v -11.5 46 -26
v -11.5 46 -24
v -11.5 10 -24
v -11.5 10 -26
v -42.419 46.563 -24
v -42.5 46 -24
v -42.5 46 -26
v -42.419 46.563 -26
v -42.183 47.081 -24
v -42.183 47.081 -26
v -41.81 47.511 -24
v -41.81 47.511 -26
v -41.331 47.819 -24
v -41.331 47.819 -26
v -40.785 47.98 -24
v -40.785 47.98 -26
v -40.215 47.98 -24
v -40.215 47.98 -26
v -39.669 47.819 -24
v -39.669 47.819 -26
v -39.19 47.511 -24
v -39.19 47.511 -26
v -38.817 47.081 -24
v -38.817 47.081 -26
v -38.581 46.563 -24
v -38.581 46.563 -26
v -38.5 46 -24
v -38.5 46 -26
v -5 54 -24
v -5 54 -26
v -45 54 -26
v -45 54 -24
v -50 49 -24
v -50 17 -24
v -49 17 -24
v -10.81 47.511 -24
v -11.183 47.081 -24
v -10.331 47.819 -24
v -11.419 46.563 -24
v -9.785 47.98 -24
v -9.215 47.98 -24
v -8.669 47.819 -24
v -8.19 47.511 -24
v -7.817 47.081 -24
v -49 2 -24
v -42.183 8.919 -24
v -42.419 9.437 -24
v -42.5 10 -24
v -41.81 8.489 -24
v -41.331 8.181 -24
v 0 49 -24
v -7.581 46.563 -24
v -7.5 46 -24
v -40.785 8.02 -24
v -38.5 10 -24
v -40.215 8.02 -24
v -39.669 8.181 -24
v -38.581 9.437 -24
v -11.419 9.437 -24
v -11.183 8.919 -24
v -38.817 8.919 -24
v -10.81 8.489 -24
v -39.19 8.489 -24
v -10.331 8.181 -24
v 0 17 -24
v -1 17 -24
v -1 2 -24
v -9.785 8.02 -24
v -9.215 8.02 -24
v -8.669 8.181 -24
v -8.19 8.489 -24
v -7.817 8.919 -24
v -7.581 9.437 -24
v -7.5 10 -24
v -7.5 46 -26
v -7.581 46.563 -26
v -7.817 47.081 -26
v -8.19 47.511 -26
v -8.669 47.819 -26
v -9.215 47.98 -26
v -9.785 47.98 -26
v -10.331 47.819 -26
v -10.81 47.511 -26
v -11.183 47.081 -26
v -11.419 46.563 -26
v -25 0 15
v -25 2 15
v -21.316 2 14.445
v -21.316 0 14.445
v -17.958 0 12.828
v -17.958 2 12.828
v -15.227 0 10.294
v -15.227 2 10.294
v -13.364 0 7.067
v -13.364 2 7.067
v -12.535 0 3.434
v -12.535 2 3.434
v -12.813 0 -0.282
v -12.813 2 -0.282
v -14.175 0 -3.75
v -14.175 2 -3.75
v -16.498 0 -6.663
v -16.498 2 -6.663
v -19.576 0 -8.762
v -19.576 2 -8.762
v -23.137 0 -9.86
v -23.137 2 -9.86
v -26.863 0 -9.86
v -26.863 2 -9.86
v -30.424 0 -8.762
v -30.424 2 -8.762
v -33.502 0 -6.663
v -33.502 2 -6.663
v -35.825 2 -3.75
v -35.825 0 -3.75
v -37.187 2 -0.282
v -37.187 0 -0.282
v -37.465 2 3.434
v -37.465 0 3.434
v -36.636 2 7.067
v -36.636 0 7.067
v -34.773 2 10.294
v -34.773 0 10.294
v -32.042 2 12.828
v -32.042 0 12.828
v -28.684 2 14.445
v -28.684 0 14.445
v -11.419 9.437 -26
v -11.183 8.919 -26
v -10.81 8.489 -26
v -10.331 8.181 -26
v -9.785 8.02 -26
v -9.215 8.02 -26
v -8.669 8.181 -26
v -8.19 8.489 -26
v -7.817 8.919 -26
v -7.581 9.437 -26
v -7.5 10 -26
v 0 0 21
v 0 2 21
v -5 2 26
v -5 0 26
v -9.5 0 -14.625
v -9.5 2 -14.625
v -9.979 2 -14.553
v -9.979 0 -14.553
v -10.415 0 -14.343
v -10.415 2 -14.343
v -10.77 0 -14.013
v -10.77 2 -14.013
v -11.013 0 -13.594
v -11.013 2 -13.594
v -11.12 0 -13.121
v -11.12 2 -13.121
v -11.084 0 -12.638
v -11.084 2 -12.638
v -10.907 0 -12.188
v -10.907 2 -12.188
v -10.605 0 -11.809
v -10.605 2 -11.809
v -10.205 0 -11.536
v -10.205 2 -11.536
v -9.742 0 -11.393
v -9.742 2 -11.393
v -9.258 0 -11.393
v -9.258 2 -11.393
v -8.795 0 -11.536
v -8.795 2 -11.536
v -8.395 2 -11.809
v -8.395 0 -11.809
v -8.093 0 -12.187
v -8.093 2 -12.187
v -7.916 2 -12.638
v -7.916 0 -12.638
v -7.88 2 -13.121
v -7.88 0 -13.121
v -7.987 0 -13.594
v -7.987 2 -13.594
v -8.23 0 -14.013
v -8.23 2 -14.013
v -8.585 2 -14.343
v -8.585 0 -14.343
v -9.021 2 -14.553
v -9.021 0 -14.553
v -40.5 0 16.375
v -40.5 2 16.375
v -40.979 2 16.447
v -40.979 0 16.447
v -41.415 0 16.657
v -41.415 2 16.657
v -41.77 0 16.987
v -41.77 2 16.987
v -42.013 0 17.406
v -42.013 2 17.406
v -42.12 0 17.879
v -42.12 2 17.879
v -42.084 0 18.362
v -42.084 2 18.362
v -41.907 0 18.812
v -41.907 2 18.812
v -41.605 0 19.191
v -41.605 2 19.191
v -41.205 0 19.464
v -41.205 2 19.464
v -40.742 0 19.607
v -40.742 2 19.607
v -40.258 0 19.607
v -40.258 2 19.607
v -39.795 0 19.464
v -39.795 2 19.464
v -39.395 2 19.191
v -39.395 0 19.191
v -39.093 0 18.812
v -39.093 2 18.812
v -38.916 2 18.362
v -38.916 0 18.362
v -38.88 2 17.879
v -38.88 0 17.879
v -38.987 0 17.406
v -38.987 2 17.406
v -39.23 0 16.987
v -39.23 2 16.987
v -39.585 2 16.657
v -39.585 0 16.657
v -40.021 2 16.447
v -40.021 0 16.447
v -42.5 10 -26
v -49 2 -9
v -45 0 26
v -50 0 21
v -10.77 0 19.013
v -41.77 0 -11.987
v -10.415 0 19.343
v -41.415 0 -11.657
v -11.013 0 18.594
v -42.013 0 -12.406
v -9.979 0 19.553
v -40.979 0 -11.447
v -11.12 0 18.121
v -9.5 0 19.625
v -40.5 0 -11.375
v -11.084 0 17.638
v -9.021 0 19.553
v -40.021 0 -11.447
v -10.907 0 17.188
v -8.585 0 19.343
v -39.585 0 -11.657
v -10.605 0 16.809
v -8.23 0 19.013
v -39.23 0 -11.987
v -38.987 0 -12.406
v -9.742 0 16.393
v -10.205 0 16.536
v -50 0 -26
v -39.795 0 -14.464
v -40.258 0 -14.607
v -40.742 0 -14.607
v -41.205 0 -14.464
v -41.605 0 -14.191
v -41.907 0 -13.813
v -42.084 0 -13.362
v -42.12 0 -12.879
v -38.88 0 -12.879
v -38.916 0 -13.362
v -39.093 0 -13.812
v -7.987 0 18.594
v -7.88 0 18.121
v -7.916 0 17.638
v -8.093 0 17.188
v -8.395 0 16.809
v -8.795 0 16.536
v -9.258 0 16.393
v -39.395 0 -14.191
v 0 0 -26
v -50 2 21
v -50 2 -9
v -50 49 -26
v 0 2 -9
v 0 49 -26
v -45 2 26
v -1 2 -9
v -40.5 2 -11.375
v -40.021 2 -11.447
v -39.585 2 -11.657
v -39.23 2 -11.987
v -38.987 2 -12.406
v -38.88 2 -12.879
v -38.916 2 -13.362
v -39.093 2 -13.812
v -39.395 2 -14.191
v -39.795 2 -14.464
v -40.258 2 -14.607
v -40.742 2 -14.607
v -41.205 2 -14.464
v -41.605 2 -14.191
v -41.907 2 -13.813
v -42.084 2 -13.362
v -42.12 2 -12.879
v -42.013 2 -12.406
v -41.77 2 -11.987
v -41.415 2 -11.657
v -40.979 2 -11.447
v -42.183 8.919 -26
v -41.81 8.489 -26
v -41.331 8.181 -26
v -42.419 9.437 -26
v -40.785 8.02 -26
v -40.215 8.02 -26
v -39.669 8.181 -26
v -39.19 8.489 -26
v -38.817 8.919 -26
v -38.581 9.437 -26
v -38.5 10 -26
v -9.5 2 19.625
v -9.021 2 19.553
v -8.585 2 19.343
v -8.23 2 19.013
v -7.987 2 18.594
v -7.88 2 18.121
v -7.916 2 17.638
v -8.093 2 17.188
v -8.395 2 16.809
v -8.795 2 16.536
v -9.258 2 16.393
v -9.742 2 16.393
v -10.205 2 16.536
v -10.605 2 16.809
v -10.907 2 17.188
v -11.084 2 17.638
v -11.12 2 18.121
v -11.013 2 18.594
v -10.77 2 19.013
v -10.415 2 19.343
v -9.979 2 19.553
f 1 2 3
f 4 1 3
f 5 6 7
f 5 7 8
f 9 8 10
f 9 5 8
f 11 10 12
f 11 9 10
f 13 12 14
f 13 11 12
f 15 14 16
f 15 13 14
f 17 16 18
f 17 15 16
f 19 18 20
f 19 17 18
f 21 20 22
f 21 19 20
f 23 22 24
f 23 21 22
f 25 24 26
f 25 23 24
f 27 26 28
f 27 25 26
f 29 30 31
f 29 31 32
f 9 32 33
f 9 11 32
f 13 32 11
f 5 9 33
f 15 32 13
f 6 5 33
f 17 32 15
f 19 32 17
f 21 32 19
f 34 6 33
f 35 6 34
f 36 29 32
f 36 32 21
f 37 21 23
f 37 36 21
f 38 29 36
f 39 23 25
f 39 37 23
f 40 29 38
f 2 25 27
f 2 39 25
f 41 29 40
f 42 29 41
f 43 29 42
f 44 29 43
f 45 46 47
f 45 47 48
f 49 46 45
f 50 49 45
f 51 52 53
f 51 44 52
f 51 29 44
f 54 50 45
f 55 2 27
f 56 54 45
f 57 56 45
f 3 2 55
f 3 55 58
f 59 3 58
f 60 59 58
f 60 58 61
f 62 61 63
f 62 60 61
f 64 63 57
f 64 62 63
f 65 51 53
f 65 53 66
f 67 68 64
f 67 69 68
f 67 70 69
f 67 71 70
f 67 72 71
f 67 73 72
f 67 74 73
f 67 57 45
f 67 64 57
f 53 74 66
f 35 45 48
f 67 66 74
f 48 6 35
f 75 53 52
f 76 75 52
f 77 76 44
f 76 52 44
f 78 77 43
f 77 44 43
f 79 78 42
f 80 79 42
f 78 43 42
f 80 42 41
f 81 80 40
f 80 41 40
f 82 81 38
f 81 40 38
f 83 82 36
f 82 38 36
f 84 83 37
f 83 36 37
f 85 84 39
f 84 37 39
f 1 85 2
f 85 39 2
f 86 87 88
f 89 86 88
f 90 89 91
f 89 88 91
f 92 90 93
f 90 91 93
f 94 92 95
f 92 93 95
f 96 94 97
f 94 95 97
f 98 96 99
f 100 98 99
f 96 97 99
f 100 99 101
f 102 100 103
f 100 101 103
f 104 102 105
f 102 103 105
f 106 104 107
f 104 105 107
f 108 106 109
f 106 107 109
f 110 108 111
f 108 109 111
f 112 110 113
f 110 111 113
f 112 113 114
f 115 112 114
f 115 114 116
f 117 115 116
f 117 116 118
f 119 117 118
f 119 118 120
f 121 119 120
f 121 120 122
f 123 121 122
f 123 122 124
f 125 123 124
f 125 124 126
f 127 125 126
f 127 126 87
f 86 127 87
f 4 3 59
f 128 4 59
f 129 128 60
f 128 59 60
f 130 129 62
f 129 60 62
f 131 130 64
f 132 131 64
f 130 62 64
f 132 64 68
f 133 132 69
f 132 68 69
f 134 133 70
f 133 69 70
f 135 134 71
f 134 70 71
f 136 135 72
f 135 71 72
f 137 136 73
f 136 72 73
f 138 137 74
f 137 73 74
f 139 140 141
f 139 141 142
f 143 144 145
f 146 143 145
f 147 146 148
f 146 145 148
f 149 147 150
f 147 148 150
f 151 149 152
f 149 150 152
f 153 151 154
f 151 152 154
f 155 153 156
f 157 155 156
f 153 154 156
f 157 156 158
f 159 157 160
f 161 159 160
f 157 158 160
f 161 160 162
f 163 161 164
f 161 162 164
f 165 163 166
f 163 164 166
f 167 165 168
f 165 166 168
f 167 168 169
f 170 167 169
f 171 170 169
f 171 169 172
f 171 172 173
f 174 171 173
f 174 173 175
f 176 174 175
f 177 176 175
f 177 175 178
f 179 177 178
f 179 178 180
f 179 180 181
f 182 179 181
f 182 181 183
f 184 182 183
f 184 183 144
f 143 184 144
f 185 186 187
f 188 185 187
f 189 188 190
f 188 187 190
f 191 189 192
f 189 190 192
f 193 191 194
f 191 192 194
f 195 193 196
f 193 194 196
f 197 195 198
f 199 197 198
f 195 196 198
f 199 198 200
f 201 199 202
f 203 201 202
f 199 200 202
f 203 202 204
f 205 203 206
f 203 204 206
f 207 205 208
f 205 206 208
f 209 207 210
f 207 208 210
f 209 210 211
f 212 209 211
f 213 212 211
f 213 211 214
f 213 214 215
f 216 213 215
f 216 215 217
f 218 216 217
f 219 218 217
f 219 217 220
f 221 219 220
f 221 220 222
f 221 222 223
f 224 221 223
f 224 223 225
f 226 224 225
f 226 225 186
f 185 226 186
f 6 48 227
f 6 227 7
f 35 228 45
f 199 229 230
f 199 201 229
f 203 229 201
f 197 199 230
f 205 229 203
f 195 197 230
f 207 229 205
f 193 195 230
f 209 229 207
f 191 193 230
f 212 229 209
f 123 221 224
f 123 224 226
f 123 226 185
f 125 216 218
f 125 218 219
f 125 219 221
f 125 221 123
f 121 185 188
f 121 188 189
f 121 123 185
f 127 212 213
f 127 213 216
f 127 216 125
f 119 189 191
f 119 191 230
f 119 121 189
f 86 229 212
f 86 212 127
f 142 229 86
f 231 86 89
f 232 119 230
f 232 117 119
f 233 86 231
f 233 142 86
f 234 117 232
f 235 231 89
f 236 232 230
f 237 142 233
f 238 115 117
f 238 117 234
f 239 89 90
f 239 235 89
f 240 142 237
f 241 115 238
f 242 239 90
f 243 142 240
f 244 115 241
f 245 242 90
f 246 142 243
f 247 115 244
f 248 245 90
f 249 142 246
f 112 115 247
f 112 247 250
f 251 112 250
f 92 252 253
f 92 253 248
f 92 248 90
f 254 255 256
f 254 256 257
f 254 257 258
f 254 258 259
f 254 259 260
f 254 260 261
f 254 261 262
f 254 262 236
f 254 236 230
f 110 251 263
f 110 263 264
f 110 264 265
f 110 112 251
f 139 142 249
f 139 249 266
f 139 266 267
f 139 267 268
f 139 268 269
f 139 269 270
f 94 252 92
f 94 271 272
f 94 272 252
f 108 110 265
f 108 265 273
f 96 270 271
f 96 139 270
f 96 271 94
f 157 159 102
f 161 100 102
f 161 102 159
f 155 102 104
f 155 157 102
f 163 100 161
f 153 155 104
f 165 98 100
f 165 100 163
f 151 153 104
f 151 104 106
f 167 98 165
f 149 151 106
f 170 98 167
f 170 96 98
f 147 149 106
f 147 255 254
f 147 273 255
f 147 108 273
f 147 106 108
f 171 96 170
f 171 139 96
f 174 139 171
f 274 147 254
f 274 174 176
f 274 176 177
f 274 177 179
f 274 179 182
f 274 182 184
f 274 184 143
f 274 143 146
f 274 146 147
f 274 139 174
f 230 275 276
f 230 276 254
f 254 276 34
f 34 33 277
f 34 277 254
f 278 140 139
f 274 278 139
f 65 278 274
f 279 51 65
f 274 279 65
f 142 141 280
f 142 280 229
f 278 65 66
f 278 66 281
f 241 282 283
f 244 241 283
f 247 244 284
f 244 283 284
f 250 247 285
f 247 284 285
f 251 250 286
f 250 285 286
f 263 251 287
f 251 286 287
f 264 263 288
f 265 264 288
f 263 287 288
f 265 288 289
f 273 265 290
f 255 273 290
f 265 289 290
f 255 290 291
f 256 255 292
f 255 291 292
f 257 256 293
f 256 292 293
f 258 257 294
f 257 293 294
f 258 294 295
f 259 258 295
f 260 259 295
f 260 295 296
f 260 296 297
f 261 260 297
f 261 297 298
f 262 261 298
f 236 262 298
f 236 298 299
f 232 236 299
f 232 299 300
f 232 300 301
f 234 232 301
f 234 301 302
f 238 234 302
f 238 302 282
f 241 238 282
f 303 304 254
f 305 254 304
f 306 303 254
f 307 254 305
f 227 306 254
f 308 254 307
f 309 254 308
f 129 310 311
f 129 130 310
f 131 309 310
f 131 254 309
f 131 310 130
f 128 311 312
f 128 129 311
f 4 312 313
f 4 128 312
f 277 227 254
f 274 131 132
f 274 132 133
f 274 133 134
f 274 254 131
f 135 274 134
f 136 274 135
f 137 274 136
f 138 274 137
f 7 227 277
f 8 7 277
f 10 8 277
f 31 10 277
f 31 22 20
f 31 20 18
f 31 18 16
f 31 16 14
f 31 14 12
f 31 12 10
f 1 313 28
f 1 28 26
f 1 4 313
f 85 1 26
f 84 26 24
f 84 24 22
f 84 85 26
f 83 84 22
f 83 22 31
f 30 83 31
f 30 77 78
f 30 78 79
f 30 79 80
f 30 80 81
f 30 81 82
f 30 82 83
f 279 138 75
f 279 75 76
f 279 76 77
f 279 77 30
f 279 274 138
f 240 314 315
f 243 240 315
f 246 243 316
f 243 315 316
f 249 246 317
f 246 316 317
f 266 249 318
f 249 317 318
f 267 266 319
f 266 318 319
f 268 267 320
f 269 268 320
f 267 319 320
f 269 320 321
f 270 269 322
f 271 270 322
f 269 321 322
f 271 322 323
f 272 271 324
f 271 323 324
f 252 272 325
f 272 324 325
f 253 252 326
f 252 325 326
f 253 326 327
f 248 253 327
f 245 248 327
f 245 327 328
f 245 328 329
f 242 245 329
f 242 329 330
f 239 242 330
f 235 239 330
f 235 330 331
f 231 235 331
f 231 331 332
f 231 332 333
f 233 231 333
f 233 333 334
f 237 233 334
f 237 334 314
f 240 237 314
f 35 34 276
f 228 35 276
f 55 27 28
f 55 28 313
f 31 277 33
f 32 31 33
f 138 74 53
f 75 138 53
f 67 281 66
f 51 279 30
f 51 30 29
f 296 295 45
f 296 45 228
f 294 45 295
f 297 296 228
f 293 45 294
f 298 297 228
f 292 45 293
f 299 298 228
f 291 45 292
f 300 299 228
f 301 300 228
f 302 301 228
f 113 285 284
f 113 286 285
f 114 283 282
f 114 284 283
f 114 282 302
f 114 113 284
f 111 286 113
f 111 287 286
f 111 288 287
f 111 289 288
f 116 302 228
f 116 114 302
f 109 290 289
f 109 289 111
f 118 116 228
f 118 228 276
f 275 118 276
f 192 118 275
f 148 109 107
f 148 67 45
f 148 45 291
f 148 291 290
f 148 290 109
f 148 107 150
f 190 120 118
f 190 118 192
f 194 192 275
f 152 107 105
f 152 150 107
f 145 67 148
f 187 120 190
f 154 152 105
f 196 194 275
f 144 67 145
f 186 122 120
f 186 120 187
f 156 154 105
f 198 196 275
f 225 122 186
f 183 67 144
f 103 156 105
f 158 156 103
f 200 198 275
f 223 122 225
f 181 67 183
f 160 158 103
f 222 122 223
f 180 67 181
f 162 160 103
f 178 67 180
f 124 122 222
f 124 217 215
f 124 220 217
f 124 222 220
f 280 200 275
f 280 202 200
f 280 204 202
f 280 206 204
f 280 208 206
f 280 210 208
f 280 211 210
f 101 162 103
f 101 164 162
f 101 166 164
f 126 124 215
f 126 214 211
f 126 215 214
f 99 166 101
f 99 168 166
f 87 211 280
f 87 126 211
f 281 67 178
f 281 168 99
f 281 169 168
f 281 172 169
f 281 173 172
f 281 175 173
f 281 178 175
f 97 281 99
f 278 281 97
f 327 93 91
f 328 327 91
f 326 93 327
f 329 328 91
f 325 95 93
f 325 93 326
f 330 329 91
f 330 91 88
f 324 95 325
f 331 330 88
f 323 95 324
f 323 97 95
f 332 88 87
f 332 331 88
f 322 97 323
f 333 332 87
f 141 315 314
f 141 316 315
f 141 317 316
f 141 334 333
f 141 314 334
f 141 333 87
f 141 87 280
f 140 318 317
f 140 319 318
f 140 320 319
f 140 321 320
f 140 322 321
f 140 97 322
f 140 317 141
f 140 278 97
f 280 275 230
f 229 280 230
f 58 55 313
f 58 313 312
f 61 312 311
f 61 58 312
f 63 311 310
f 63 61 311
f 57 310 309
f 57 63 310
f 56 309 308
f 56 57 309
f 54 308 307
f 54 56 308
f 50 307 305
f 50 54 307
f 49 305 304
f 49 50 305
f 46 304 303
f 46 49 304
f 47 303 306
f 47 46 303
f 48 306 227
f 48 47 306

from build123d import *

# Parameters (mm, degrees)
BOSS_EXTRUDE1_DEPTH = 50
CHAMFER1_SIZE       = 5
SKETCH2_R           = 1.625
SKETCH2_R_2         = 12.5
CUT_EXTRUDE1_DEPTH  = 77.681158051
CUT_EXTRUDE2_DEPTH  = 89.971905678
BOSS_EXTRUDE2_DEPTH = 1
BOSS_EXTRUDE3_START = -50
BOSS_EXTRUDE3_DEPTH = 1


with BuildPart() as part:
    # Sketch1 → Boss-Extrude1 (new body)
    with BuildSketch(Plane(origin=(0, 0, 0), x_dir=(0, 0, -1), z_dir=(1, 0, 0))):
        Polygon((-26, 0), (26, 0), (26, 54), (24, 54), (24, 2), (-26, 2), align=None)
    extrude(amount=-BOSS_EXTRUDE1_DEPTH)

    # Chamfer1
    chamfer1_edges = [part.edges().sort_by_distance(p)[0] for p in [
        (-50, 54, -25),
        (-50, 1, 26),
        (0, 54, -25),
        (0, 1, 26),
    ]]
    chamfer(chamfer1_edges, length=CHAMFER1_SIZE)

    # Sketch2 → Cut-Extrude1 (cut, through all)
    with BuildSketch(Plane(origin=(0, 2, 0), x_dir=(1, 0, 0), z_dir=(0, 1, 0))):
        with Locations(Location((-40.5, 13, 0), (0, 0, 270))):
            Circle(SKETCH2_R)
        with Locations(Location((-9.5, 13, 0), (0, 0, 90))):
            Circle(SKETCH2_R)
        with Locations(Location((-9.5, -18, 0), (0, 0, 270))):
            Circle(SKETCH2_R)
        with Locations(Location((-40.5, -18, 0), (0, 0, 90))):
            Circle(SKETCH2_R)
        with Locations(Location((-25, -2.5, 0), (0, 0, 270))):
            Circle(SKETCH2_R_2)
    extrude(amount=-CUT_EXTRUDE1_DEPTH, mode=Mode.SUBTRACT)

    # Sketch3 → Cut-Extrude2 (cut, through all)
    with BuildSketch(Plane.XY.offset(-24)):
        with BuildLine():
            Line((-38.5, 46), (-38.5, 10))
            ThreePointArc((-38.5, 10), (-40.5, 8), (-42.5, 10))
            Line((-42.5, 10), (-42.5, 46))
            ThreePointArc((-42.5, 46), (-40.5, 48), (-38.5, 46))
        make_face()
        with BuildLine():
            Line((-11.5, 46), (-11.5, 10))
            ThreePointArc((-11.5, 10), (-9.5, 8), (-7.5, 10))
            Line((-7.5, 10), (-7.5, 46))
            ThreePointArc((-7.5, 46), (-9.5, 48), (-11.5, 46))
        make_face()
    extrude(amount=-CUT_EXTRUDE2_DEPTH, mode=Mode.SUBTRACT)

    # Sketch4 → Boss-Extrude2 (add)
    with BuildSketch(Plane(origin=(0, 0, 0), x_dir=(0, 0, -1), z_dir=(1, 0, 0))):
        Polygon((9, 2), (24, 2), (24, 17), align=None)
    extrude(amount=-BOSS_EXTRUDE2_DEPTH)

    # Sketch4<2> → Boss-Extrude3 (add)
    with BuildSketch(Plane(origin=(0, 0, 0), x_dir=(0, 0, -1), z_dir=(1, 0, 0)).offset(BOSS_EXTRUDE3_START)):
        Polygon((9, 2), (24, 2), (24, 17), align=None)
    extrude(amount=BOSS_EXTRUDE3_DEPTH)


solid = part.part
